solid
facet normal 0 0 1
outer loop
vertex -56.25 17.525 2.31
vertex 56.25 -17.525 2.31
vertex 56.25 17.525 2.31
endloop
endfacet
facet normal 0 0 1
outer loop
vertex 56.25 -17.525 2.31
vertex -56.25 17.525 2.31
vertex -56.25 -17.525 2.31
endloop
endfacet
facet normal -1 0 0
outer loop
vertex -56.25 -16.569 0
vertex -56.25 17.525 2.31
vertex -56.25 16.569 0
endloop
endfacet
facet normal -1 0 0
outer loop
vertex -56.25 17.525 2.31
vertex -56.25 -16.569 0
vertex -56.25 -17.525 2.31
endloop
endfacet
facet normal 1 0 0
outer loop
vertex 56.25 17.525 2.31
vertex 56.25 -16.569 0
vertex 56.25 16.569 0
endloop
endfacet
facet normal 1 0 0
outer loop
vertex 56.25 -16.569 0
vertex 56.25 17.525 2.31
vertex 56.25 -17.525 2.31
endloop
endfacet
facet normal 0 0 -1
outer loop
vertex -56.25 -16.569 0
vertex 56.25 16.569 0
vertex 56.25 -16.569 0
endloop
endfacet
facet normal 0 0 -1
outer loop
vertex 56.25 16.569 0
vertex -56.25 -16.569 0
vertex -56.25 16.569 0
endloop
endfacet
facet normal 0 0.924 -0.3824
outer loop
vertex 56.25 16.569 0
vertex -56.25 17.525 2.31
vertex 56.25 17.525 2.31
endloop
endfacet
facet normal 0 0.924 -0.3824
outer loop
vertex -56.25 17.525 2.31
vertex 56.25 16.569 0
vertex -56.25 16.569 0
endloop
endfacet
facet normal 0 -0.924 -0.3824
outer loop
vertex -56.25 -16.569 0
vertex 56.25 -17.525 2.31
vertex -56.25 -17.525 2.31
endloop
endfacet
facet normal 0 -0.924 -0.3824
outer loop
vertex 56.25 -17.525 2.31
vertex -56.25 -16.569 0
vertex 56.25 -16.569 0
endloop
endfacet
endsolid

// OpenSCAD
// Paneled cache pot base panel.

// ---------- Public parameters (mm) ----------
inside_radius = 75 / 2;
inside_height = 110;
min_wall_thickness = 2.5;
bottom_thickness = 2.5;
bottom_edge_width = 10;
num_panels = 8;
panel_thickness = 2.5;

// ---------- Resolution ----------
$fa = 1;
$fs = 1;

// ---------- Derived ----------
outside_height = inside_height + bottom_thickness;
outside_radius = (inside_radius + min_wall_thickness) / cos(180 / num_panels);

module outside_cylinder() {
  cylinder(outside_height, outside_radius, outside_radius, $fn = num_panels);
}

module inside_cutout() {
  translate([0, 0, bottom_thickness])
    cylinder(inside_height + 1, inside_radius, inside_radius);
  translate([0, 0, -0.5 * bottom_thickness])
    cylinder(2 * bottom_thickness, inside_radius - bottom_edge_width, inside_radius - bottom_edge_width);
}

module core() {
  difference() {
    outside_cylinder();
    inside_cutout();
  }
}

module panel() {
  difference() {
    cylinder(outside_height, outside_radius + panel_thickness, outside_radius + panel_thickness, $fn = num_panels);
    translate([0, 0, -1])
      cylinder(outside_height + 2, outside_radius, outside_radius, $fn = num_panels);
    translate([-(outside_radius + panel_thickness + 1), 0, -1])
      cube([2 * (outside_radius + panel_thickness + 1), 2 * (outside_radius + panel_thickness + 1), outside_height + 2]);
    rotate([0, 0, 180 - 360 / num_panels])
      translate([-(outside_radius + panel_thickness + 1), 0, -1])
        cube([2 * (outside_radius + panel_thickness + 1), 2 * (outside_radius + panel_thickness + 1), outside_height + 2]);
  }
}

module panel_flat_on_bed() {
  translate([outside_height / 2, 0, -(inside_radius + min_wall_thickness)])
    rotate([0, -90, 0])
      rotate([0, 0, 180 / num_panels])
        panel();
}

panel_flat_on_bed();
//color("red") panel();
//color("yellow") core();
